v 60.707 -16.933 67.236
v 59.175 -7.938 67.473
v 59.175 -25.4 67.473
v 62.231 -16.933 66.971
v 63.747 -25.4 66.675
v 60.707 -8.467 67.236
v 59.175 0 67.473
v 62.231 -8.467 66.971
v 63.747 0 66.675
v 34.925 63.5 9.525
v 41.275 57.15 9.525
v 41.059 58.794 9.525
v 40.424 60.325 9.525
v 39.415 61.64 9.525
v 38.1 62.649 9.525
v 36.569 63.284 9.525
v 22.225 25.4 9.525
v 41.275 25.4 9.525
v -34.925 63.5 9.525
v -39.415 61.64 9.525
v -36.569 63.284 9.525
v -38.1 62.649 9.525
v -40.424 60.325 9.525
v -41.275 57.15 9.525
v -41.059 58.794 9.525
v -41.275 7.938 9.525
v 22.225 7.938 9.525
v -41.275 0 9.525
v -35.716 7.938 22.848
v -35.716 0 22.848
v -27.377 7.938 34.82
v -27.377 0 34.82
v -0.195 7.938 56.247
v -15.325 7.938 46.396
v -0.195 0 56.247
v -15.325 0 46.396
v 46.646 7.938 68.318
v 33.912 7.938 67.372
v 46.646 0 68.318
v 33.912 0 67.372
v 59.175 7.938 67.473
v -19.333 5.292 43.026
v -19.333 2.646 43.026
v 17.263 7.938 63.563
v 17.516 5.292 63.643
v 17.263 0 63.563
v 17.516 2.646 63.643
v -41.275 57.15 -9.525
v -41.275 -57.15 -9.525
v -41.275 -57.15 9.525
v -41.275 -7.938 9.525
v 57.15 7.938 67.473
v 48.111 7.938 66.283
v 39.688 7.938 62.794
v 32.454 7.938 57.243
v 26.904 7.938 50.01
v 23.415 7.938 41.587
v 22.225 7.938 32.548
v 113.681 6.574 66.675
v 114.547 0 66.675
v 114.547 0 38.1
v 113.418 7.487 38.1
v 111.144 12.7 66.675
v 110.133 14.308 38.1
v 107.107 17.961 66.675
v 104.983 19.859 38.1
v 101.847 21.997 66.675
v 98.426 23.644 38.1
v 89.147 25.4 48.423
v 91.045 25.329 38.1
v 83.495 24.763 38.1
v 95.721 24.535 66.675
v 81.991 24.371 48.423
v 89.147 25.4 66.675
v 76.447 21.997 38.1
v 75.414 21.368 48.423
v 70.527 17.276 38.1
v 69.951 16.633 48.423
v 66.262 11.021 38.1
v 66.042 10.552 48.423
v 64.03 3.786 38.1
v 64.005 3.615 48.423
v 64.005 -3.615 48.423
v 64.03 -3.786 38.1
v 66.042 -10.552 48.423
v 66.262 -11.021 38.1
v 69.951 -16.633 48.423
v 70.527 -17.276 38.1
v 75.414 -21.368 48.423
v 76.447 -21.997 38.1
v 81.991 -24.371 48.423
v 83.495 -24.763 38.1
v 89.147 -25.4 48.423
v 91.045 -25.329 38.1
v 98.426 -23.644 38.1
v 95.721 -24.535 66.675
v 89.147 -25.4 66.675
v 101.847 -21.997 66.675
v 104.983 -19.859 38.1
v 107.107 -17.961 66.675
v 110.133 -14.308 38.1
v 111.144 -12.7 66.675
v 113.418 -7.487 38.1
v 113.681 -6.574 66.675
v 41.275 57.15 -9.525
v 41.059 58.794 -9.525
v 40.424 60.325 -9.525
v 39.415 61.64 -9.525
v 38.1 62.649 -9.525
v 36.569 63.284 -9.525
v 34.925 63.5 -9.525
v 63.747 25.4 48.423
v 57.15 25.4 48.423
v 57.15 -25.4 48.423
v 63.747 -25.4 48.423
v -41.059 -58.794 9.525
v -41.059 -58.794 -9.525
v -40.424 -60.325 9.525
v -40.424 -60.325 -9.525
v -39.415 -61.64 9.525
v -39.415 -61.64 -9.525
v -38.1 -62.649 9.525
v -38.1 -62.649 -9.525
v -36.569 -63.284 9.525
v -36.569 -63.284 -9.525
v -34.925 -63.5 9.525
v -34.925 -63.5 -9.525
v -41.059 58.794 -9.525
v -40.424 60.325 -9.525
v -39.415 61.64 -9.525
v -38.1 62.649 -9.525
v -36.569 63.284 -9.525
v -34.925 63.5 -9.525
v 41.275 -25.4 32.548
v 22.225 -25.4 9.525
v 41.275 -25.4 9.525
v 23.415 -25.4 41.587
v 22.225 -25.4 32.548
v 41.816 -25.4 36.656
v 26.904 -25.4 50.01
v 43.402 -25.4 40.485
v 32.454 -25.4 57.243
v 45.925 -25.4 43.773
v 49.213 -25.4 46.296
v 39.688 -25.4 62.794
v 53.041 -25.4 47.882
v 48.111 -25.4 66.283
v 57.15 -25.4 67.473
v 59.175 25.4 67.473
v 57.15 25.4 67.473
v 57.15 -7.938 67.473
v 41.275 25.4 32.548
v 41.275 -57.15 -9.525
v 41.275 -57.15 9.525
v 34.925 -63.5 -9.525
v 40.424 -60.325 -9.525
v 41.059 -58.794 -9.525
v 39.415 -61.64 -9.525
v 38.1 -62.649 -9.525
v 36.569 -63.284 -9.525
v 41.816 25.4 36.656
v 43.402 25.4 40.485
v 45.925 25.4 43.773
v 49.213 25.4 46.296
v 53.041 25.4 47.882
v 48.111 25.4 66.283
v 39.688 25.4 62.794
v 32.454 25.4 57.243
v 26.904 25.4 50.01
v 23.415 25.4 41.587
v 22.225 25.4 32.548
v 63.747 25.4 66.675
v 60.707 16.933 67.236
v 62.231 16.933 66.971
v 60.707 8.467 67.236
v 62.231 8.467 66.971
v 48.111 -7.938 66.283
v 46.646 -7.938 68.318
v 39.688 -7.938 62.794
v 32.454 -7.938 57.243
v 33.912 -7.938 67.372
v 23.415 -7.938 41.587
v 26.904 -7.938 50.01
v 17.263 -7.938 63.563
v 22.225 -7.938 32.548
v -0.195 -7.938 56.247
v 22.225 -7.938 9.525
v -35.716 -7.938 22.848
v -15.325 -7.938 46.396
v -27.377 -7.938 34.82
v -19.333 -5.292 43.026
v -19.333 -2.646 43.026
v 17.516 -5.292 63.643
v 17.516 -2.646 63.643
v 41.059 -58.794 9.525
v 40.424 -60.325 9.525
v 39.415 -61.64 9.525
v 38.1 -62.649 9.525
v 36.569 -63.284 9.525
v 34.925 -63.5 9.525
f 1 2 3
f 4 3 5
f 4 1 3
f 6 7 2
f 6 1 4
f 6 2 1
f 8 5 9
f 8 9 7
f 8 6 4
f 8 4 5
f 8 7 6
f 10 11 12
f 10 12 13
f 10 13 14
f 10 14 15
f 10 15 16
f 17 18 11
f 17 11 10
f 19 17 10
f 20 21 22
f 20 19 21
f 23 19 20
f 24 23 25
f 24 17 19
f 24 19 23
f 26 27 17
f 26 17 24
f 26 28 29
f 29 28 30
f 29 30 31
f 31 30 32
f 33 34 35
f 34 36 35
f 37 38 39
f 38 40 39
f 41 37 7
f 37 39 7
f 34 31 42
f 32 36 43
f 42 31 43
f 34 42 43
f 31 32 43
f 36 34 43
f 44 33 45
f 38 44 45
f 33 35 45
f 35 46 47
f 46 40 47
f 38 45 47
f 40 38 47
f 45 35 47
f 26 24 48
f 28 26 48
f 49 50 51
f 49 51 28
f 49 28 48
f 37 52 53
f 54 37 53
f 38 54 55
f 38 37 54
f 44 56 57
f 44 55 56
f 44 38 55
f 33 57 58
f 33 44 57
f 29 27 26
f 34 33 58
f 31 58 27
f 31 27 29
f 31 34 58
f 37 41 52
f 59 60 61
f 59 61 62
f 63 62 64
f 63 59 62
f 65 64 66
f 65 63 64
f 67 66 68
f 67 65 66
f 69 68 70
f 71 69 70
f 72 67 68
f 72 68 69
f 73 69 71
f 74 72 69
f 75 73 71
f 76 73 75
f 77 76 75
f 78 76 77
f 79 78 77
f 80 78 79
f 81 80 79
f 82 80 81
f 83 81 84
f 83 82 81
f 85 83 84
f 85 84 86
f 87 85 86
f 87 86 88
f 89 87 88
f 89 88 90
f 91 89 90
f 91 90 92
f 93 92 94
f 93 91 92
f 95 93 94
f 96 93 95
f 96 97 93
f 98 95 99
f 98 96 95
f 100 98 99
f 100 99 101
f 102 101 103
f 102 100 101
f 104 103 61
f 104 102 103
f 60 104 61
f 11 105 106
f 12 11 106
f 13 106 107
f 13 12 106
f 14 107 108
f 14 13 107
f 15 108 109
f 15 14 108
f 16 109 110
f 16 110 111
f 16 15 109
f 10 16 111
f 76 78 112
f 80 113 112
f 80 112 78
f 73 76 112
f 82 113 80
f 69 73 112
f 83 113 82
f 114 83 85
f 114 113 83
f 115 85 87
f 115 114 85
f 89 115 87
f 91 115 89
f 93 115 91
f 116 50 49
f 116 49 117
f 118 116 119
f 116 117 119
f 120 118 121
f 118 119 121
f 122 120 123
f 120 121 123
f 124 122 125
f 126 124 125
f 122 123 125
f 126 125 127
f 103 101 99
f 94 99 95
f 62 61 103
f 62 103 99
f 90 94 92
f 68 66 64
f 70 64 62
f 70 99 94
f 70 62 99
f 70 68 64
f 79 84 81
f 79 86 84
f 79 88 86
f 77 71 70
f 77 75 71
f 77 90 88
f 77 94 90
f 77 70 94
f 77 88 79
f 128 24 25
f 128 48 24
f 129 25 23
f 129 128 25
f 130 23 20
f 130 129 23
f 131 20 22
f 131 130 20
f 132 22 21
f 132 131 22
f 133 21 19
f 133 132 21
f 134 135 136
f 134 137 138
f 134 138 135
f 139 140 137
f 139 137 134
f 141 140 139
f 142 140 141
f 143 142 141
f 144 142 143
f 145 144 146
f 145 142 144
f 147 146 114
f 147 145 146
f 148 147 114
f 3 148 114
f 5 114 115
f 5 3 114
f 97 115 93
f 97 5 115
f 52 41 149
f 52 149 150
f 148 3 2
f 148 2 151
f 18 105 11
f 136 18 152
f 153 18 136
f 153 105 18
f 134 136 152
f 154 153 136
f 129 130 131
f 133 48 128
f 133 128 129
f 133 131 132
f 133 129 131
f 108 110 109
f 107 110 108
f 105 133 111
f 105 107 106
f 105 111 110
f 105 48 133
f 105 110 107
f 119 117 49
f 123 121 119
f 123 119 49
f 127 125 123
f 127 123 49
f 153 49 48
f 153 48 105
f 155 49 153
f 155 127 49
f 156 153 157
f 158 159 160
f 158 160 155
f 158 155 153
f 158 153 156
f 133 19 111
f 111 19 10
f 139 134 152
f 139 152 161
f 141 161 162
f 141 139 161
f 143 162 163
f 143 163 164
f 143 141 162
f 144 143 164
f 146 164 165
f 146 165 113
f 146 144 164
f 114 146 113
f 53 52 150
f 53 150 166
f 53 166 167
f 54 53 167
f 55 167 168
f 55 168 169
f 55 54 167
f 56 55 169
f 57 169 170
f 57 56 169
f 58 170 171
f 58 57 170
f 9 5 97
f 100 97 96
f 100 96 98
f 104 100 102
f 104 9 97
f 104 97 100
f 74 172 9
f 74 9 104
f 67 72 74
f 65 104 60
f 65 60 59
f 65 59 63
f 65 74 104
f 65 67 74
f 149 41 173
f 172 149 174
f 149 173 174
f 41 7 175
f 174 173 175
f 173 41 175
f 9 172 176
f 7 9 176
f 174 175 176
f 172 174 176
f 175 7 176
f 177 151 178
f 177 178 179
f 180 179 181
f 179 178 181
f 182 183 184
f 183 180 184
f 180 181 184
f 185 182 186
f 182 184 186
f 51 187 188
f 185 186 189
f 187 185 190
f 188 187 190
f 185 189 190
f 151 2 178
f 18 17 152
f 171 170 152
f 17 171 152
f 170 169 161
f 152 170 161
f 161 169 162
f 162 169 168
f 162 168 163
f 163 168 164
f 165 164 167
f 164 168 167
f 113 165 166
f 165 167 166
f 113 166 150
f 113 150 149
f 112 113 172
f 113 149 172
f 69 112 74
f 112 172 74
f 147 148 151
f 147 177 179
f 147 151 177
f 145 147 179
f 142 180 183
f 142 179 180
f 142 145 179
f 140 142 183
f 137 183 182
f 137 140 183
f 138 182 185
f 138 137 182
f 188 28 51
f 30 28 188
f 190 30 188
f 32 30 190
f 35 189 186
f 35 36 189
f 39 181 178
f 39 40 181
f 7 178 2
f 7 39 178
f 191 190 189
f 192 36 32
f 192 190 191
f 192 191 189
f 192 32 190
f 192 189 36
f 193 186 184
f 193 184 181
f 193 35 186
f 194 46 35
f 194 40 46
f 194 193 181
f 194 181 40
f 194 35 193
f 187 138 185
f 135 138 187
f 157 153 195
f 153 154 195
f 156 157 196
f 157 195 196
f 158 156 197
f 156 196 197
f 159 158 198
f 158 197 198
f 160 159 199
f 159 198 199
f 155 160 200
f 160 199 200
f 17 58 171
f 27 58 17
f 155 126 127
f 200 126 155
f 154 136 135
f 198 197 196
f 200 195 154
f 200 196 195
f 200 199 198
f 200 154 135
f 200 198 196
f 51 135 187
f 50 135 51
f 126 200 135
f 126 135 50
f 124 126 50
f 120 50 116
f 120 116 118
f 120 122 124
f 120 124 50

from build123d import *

# Parameters (mm, degrees)
F1_DEPTH = 63.5
F0_W     = 25.4
F0_H     = 18.2524110483
F2_DEPTH = 25.4
F3_DEPTH = 7.9375
F5_R     = 6.35


with BuildPart() as f1:
    # F0 (on Front) → F1 (new body, symmetric)
    with BuildSketch(Plane.XZ):
        Polygon((-41.275, 9.525), (-41.275, -9.525), (41.275, -9.525), (41.275, 9.525), (22.225, 9.525), align=None)
    extrude(amount=F1_DEPTH, both=True)

    # F0 (on Front) → F2 (join, symmetric)
    with BuildSketch(Plane.XZ):
        with BuildLine():
            Line((22.225, 9.525), (41.275, 9.525))
            Line((41.275, 9.525), (41.275, 32.5475889517))
            ThreePointArc((41.275, 32.5475889517), (45.9246798487, 43.772909103), (57.15, 48.4225889517))
            Line((57.15, 48.4225889517), (63.746570544, 48.4225889517))
            Line((63.746570544, 48.4225889517), (63.746570544, 66.675))
            add(Edge.make_bspline(
                [(59.1752846606, 67.4725889517), (60.7111512881, 67.2512383806), (62.2357271137, 66.985690031), (63.746570544, 66.675)],
                knots=[115.2165224238, 115.2165224238, 115.2165224238, 115.2165224238, 119.5644294074, 119.5644294074, 119.5644294074, 119.5644294074], degree=3))
            Line((59.1752846606, 67.4725889517), (57.15, 67.4725889517))
            ThreePointArc((57.15, 67.4725889517), (32.4542956671, 57.2432932846), (22.225, 32.5475889517))
            Line((22.225, 32.5475889517), (22.225, 9.525))
        make_face()
        with Locations((76.446570544, 57.5487944758)):
            Rectangle(F0_W, F0_H)
    extrude(amount=F2_DEPTH, both=True)

    # F0 (on Front) → F3 (join, symmetric)
    with BuildSketch(Plane.XZ):
        with BuildLine():
            add(Edge.make_bspline(
                [(-41.275, 9.525), (-30.1520692278, 48.1675955618), (18.4758832255, 73.3382257116), (59.1752846606, 67.4725889517)],
                knots=[0, 0, 0, 0, 115.2165224238, 115.2165224238, 115.2165224238, 115.2165224238], degree=3))
            Line((-41.275, 9.525), (22.225, 9.525))
            Line((22.225, 9.525), (22.225, 32.5475889517))
            ThreePointArc((22.225, 32.5475889517), (32.4542956671, 57.2432932846), (57.15, 67.4725889517))
            Line((57.15, 67.4725889517), (59.1752846606, 67.4725889517))
        make_face()
    extrude(amount=F3_DEPTH, both=True)

    # F0 (on Front) → F4 (revolve)
    with BuildSketch(Plane.XZ):
        Polygon((114.546570544, 66.675), (89.146570544, 66.675), (89.146570544, 48.4225889517), (89.146570544, 38.1), (114.546570544, 38.1), align=None)
    revolve(axis=Axis((89.146570544, 0, 52.7862944758), (0, 0, 1)))

    # F5
    f5_edges = [f1.edges().sort_by_distance(p)[0] for p in [
        (41.275, -63.5, 0),
        (-41.275, -63.5, 0),
        (41.275, 63.5, 0),
        (-41.275, 63.5, 0),
    ]]
    fillet(f5_edges, radius=F5_R)


solid = f1.part
